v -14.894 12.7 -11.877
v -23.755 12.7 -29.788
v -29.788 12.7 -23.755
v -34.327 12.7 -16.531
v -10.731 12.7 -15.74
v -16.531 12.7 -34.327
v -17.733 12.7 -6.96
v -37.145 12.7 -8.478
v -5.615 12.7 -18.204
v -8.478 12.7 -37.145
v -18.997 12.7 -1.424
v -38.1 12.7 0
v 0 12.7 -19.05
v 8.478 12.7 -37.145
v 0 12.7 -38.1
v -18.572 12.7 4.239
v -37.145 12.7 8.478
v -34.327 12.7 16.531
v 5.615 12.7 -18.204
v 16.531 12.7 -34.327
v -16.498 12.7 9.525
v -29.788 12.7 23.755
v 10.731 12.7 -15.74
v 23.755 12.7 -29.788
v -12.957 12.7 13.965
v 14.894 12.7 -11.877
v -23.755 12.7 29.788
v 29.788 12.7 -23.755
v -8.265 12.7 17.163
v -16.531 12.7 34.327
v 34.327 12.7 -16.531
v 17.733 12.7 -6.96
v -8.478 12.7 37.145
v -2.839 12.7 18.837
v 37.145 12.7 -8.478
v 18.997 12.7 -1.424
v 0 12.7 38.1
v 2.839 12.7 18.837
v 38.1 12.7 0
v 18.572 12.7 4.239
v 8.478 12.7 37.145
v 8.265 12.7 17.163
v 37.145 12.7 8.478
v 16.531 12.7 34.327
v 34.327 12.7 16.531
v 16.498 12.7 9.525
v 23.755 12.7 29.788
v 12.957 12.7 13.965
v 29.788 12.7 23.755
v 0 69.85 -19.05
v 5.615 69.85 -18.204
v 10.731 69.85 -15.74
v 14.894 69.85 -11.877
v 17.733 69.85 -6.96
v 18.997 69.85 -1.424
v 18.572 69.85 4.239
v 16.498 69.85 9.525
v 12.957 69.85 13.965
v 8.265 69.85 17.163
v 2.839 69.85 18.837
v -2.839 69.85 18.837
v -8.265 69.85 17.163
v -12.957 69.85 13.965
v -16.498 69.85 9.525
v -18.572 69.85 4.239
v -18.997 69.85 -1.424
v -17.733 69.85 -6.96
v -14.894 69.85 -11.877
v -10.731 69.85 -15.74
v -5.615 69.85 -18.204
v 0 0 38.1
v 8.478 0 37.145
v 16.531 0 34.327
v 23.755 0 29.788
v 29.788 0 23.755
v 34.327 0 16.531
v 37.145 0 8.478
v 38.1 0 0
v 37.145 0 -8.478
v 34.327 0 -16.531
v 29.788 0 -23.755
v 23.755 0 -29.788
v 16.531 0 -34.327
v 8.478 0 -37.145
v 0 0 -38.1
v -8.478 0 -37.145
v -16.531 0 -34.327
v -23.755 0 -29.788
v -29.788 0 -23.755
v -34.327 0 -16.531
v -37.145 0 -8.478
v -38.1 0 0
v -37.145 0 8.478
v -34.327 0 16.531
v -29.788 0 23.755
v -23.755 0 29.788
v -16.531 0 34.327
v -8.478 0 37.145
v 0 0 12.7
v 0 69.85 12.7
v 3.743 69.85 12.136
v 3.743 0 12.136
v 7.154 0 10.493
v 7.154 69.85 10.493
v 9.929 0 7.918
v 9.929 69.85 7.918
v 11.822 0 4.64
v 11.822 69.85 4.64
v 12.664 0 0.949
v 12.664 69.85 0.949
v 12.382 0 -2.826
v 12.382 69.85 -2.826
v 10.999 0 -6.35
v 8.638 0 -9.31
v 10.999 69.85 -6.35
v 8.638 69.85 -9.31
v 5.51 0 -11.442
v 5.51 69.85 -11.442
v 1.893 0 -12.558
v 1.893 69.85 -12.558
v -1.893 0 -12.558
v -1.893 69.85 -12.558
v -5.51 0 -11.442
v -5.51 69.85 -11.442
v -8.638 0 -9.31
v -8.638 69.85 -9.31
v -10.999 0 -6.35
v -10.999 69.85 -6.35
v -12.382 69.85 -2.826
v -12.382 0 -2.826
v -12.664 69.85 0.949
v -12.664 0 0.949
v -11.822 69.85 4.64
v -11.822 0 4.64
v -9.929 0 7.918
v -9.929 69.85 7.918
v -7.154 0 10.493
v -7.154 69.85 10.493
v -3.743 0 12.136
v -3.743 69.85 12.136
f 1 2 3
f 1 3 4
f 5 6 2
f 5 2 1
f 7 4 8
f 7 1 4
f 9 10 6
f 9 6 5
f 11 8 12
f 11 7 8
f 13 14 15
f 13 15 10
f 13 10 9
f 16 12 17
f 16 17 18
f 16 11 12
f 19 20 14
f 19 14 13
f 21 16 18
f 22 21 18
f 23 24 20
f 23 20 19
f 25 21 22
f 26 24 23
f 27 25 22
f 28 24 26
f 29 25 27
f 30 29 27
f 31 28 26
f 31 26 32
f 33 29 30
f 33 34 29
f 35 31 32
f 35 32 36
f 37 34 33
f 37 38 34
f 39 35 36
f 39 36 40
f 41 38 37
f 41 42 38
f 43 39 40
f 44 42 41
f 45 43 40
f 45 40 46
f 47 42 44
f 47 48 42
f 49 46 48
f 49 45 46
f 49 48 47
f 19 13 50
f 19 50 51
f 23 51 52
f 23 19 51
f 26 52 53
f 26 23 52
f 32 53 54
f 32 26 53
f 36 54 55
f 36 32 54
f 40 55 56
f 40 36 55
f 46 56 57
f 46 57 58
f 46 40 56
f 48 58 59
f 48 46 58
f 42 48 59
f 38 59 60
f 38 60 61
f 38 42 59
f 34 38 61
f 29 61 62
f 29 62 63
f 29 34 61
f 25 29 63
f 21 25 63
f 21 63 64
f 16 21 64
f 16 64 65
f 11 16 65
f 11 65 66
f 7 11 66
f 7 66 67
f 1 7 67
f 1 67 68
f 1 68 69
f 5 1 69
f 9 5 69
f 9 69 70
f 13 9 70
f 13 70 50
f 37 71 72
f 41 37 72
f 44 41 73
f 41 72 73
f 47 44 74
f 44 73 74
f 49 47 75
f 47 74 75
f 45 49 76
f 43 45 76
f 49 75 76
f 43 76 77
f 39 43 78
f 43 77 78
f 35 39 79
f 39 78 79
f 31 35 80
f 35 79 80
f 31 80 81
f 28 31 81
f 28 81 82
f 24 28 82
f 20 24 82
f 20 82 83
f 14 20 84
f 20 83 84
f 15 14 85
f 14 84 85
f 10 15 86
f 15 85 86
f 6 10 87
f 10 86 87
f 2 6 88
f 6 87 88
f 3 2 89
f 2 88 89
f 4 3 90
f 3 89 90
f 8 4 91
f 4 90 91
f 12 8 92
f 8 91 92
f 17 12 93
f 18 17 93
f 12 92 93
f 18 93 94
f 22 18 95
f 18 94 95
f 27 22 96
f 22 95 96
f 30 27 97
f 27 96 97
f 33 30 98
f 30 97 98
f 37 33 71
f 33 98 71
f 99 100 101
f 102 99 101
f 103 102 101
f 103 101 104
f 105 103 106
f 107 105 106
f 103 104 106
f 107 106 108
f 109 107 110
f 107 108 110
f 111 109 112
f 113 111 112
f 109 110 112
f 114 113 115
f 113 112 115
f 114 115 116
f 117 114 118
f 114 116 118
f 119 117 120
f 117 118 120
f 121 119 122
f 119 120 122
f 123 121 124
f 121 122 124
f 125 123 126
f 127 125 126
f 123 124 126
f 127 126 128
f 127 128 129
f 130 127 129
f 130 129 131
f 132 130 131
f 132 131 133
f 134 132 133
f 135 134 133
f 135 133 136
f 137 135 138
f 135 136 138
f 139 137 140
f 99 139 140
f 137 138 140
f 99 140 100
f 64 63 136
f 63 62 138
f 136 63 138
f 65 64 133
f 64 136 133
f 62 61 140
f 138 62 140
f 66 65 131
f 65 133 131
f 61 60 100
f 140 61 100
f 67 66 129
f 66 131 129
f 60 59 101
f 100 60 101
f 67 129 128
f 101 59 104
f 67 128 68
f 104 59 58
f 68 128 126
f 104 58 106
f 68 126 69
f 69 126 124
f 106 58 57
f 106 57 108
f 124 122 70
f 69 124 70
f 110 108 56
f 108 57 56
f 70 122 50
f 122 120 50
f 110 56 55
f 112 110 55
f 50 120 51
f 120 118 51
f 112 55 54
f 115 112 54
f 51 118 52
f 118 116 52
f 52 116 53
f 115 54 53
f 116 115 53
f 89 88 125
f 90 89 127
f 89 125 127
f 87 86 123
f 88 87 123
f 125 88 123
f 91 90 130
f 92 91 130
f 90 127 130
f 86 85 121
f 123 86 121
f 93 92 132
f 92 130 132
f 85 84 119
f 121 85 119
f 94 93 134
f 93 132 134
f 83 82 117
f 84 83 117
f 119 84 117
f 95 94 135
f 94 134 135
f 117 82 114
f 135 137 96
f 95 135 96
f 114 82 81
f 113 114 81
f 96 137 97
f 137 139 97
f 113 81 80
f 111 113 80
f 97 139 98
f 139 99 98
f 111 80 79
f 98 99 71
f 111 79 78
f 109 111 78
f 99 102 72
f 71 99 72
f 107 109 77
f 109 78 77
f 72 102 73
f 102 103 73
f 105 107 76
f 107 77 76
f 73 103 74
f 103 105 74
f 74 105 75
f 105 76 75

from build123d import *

# Parameters (mm, degrees)
SKETCH1_R           = 38.1
SKETCH1_R_2         = 19.05
BOSS_EXTRUDE1_DEPTH = 12.7
SKETCH2_R           = 19.05
BOSS_EXTRUDE3_DEPTH = 69.85
SKETCH3_R           = 12.7
CUT_EXTRUDE1_DEPTH  = 69.85


with BuildPart() as part:
    # Sketch1 → Boss-Extrude1 (new body)
    with BuildSketch(Plane(origin=(0, 0, 0), x_dir=(1, 0, 0), z_dir=(0, 1, 0))):
        with Locations(Location((0, 0, 0), (0, 0, 270))):
            Circle(SKETCH1_R)
        with Locations(Location((0, 0, 0), (0, 0, 270))):
            Circle(SKETCH1_R_2, mode=Mode.SUBTRACT)
    extrude(amount=BOSS_EXTRUDE1_DEPTH)

    # Sketch2 → Boss-Extrude3 (add)
    with BuildSketch(Plane.XZ):
        with Locations(Location((0, 0, 0), (0, 0, 270))):
            Circle(SKETCH2_R)
    extrude(amount=-BOSS_EXTRUDE3_DEPTH)

    # Sketch3 → Cut-Extrude1 (cut)
    with BuildSketch(Plane(origin=(0, 69.85, 0), x_dir=(1, 0, 0), z_dir=(0, 1, 0))):
        with Locations(Location((0, 0, 0), (0, 0, 270))):
            Circle(SKETCH3_R)
    extrude(amount=-CUT_EXTRUDE1_DEPTH, mode=Mode.SUBTRACT)


solid = part.part
